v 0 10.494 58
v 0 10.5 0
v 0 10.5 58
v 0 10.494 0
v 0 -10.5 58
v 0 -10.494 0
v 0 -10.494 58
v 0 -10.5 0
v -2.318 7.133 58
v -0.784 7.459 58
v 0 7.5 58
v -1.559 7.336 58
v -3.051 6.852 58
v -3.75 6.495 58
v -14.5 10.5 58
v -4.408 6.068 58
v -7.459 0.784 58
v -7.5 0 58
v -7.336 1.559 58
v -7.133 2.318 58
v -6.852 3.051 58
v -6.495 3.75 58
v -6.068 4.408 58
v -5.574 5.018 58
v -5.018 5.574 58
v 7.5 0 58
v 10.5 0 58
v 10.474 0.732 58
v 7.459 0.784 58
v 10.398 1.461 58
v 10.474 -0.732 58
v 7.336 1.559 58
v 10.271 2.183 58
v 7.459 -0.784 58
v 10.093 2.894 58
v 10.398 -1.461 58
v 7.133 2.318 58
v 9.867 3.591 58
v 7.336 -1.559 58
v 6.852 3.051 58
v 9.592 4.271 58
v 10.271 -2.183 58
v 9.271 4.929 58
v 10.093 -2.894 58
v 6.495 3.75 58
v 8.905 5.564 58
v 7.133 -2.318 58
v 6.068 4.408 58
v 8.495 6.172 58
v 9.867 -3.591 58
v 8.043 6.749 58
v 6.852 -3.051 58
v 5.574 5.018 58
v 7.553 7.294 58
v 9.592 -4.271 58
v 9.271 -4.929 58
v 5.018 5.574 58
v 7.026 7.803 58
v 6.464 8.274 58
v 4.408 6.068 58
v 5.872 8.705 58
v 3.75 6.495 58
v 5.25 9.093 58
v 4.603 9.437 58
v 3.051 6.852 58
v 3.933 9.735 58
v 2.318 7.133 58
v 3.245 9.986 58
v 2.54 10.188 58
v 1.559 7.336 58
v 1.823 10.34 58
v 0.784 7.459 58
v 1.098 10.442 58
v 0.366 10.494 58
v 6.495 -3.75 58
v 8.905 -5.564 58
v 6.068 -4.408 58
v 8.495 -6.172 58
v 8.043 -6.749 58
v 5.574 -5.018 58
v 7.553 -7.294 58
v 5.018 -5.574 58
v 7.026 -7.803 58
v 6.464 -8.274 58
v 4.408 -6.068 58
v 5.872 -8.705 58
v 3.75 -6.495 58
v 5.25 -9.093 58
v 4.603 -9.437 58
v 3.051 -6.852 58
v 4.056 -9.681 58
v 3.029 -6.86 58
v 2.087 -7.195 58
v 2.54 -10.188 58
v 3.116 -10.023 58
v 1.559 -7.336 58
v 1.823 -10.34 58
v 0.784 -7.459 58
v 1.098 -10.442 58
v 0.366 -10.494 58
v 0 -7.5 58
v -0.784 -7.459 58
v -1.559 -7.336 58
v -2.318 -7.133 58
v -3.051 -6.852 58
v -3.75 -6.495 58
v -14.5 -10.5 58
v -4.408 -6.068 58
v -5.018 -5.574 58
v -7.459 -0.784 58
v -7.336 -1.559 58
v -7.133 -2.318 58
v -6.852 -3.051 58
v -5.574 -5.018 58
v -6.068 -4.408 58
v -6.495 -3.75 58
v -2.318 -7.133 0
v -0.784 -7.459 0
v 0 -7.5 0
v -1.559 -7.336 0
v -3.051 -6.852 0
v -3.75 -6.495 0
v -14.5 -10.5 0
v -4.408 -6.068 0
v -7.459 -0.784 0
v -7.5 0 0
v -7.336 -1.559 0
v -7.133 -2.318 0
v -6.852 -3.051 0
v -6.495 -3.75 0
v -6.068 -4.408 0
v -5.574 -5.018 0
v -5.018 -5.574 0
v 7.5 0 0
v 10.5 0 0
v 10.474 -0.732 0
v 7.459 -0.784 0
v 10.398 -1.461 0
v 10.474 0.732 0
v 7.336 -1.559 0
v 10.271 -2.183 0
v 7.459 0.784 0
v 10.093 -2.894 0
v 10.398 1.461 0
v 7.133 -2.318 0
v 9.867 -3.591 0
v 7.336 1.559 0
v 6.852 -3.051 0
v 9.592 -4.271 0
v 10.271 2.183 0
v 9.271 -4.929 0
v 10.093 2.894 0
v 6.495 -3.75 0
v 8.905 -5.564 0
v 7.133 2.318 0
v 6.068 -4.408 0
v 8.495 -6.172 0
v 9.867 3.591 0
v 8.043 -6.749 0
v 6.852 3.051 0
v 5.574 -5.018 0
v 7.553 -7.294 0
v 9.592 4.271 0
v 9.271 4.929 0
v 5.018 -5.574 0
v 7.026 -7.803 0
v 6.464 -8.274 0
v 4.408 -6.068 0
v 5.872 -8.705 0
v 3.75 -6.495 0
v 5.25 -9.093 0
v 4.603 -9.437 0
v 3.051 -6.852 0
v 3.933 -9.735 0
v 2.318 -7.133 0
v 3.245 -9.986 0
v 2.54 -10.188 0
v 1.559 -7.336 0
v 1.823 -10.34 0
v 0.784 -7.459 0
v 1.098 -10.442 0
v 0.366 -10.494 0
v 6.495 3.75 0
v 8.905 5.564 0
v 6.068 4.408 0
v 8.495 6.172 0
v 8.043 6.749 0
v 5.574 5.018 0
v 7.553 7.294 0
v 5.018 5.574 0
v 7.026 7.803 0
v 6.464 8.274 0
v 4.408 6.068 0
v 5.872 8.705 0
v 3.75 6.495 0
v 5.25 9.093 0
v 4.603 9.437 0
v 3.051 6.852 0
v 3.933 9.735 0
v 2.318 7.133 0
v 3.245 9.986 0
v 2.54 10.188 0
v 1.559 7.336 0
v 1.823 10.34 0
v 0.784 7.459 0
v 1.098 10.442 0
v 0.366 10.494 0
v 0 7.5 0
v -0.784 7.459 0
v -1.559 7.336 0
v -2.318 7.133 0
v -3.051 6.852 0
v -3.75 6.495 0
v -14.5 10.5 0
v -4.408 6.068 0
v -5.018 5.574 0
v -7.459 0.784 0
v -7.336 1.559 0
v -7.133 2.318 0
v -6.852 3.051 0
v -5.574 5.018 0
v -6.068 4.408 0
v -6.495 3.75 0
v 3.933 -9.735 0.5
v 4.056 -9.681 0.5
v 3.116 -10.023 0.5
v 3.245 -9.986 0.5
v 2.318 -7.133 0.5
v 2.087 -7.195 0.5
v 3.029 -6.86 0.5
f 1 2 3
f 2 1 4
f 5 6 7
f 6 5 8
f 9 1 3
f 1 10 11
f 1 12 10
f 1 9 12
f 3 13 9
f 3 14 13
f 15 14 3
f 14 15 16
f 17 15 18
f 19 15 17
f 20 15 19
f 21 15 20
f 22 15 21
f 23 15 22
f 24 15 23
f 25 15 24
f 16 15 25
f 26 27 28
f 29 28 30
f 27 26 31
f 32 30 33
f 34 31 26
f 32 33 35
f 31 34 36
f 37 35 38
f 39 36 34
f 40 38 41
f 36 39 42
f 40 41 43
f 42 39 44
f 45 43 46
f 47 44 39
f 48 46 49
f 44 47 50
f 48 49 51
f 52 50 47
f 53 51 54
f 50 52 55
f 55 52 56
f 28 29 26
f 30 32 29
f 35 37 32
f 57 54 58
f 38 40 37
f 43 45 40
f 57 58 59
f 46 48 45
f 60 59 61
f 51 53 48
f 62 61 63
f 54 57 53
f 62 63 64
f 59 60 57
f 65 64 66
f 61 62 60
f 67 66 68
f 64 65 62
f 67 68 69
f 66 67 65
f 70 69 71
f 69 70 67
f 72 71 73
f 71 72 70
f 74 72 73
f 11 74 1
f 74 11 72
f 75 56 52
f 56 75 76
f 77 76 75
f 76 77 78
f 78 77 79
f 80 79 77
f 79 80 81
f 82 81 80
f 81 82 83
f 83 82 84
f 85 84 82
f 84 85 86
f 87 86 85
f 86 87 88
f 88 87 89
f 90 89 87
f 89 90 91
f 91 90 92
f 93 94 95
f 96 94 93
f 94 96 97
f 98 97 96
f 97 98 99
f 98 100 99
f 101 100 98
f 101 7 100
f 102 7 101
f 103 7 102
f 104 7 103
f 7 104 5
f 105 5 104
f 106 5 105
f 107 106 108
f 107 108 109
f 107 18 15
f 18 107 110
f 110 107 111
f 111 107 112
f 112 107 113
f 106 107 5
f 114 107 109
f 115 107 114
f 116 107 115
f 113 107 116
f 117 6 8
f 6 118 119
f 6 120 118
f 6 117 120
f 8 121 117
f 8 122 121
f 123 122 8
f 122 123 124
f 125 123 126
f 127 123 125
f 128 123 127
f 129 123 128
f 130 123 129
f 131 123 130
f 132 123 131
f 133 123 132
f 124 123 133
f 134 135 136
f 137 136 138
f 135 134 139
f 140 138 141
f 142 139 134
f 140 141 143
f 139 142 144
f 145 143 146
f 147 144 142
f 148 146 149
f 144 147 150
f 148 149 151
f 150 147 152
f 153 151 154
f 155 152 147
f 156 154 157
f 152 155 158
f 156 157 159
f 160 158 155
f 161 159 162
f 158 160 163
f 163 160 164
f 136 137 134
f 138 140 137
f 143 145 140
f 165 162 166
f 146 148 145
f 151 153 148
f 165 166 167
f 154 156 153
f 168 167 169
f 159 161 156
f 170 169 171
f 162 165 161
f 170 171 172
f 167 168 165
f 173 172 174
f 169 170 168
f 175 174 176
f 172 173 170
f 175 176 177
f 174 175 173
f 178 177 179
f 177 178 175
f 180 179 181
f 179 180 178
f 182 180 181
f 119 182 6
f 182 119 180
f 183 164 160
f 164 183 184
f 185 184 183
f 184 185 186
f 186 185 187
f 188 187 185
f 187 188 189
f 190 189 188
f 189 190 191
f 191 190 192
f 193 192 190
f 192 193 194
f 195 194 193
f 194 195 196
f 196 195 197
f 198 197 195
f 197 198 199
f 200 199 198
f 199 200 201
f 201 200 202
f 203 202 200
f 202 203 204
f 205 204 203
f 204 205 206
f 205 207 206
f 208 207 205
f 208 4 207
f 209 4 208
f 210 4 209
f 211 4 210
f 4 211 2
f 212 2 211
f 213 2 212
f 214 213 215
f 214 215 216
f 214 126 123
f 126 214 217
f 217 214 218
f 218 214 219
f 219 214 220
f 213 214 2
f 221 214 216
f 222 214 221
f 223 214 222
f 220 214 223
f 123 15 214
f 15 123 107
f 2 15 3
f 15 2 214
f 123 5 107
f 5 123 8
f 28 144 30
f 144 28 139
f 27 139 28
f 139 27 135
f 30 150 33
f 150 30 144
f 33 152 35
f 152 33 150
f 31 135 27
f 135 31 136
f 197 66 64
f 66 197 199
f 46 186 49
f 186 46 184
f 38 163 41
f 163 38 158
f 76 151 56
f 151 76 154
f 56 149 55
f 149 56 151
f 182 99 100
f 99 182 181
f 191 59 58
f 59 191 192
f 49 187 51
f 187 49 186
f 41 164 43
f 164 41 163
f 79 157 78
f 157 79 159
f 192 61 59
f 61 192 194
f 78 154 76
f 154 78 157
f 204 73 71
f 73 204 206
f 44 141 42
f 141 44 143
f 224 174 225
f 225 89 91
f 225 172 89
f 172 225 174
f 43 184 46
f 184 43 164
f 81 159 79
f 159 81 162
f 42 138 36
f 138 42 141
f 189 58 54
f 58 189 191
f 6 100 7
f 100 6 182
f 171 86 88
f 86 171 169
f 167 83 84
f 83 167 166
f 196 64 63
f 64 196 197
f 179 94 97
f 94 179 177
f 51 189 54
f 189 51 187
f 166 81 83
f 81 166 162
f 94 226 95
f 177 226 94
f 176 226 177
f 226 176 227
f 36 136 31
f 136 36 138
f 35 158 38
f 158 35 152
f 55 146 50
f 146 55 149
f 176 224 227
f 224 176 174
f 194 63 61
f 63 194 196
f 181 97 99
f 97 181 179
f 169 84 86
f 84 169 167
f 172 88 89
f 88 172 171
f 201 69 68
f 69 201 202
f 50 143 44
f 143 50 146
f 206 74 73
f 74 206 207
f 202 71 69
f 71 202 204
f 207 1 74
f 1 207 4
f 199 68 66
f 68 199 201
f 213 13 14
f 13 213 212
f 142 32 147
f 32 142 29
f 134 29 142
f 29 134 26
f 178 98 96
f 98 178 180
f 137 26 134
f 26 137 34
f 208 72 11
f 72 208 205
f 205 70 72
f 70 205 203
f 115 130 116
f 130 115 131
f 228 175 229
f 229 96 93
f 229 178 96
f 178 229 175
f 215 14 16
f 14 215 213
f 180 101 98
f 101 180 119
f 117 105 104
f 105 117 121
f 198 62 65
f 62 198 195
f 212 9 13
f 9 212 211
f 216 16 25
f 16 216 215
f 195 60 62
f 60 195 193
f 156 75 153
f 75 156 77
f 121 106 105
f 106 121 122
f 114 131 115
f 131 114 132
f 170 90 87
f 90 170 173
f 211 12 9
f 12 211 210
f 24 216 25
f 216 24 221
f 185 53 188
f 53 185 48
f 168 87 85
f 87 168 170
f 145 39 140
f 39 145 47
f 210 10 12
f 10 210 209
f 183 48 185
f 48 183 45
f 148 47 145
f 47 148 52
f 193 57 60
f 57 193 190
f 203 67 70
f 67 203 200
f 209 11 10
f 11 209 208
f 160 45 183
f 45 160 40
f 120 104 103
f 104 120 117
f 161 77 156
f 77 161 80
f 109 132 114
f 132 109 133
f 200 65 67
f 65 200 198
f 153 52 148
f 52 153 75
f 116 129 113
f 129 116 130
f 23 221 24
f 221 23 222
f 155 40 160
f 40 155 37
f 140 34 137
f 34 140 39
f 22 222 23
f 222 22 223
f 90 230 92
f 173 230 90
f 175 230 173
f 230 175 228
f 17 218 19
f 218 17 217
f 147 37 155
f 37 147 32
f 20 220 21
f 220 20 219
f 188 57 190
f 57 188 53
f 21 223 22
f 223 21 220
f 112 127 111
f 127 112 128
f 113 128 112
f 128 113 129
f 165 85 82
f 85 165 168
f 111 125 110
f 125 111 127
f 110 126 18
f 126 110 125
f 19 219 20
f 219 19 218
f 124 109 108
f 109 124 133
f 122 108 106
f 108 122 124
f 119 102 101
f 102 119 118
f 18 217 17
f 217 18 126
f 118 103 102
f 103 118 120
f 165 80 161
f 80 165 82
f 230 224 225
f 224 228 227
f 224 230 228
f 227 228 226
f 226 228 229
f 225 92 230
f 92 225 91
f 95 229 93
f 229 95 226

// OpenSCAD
// PRUSA iteration3
// Bearing holders
// GNU GPL v3
// Josef Průša <iam@josefprusa.cz> and contributors
// http://www.reprap.org/wiki/Prusa_Mendel
// http://prusamendel.org

bearing_diameter = 15;

module horizontal_bearing_base(bearings=1){
 translate(v=[0,0,6]) cube(size = [24,8+bearings*25,12], center = true);	
}
module horizontal_bearing_holes(bearings=1){
 cutter_lenght = 10+bearings*25;
 one_holder_lenght = 8+25;
 holder_lenght = 8+bearings*25;
 
 // Main bearing cut
 difference(){
  translate(v=[0,0,12]) rotate(a=[90,0,0]) translate(v=[0,0,-cutter_lenght/2]) cylinder(h = cutter_lenght, r=bearing_diameter/2, $fn=50);
  // Bearing retainers
  translate(v=[0,1-holder_lenght/2,3]) cube(size = [24,6,8], center = true);
  translate(v=[0,-1+holder_lenght/2,3]) cube(size = [24,6,8], center = true);
 }
 
 // Ziptie cutouts
 ziptie_cut_ofset = 0;
 for ( i = [0 : bearings-1] ){
  // For easier positioning I move them by half of one 
  // bearing holder then add each bearign lenght and then center again
  translate(v=[0,-holder_lenght/2,0]) translate(v=[0,one_holder_lenght/2+i*25,0]) difference(){
   union(){
    translate(v=[0,2-6,12]) rotate(a=[90,0,0]) translate(v=[0,0,0]) cylinder(h = 4, r=12.5, $fn=50);
    translate(v=[0,2+6,12]) rotate(a=[90,0,0]) translate(v=[0,0,0]) cylinder(h = 4, r=12.5, $fn=50);
   }
   translate(v=[0,10,12]) rotate(a=[90,0,0]) translate(v=[0,0,0]) cylinder(h = 24, r=10, $fn=50);
  }
 }
 
}

module horizontal_bearing_test(){
 difference(){
  horizontal_bearing_base(1);
  horizontal_bearing_holes(1);
 }
 translate(v=[30,0,0]) difference(){
  horizontal_bearing_base(2);
  horizontal_bearing_holes(2);
 }
 translate(v=[60,0,0]) difference(){
  horizontal_bearing_base(3);
  horizontal_bearing_holes(3);
 }
}



thinwall = 3;
bearing_size = bearing_diameter + 2 * thinwall;

module vertical_bearing_base(){
 translate(v=[-2-bearing_size/4,0,29]) cube(size = [4+bearing_size/2,bearing_size,58], center = true);
 cylinder(h = 58, r=bearing_size/2, $fn = 90);
}

module vertical_bearing_holes(){
  translate(v=[0,0,-1]) cylinder(h = 62, r=bearing_diameter/2, $fn = 60);
  rotate(a=[0,0,-70]) translate(v=[8,0,31.5]) cube(size = [5,1,62], center = true);
}

difference(){
vertical_bearing_base();
vertical_bearing_holes();
}
